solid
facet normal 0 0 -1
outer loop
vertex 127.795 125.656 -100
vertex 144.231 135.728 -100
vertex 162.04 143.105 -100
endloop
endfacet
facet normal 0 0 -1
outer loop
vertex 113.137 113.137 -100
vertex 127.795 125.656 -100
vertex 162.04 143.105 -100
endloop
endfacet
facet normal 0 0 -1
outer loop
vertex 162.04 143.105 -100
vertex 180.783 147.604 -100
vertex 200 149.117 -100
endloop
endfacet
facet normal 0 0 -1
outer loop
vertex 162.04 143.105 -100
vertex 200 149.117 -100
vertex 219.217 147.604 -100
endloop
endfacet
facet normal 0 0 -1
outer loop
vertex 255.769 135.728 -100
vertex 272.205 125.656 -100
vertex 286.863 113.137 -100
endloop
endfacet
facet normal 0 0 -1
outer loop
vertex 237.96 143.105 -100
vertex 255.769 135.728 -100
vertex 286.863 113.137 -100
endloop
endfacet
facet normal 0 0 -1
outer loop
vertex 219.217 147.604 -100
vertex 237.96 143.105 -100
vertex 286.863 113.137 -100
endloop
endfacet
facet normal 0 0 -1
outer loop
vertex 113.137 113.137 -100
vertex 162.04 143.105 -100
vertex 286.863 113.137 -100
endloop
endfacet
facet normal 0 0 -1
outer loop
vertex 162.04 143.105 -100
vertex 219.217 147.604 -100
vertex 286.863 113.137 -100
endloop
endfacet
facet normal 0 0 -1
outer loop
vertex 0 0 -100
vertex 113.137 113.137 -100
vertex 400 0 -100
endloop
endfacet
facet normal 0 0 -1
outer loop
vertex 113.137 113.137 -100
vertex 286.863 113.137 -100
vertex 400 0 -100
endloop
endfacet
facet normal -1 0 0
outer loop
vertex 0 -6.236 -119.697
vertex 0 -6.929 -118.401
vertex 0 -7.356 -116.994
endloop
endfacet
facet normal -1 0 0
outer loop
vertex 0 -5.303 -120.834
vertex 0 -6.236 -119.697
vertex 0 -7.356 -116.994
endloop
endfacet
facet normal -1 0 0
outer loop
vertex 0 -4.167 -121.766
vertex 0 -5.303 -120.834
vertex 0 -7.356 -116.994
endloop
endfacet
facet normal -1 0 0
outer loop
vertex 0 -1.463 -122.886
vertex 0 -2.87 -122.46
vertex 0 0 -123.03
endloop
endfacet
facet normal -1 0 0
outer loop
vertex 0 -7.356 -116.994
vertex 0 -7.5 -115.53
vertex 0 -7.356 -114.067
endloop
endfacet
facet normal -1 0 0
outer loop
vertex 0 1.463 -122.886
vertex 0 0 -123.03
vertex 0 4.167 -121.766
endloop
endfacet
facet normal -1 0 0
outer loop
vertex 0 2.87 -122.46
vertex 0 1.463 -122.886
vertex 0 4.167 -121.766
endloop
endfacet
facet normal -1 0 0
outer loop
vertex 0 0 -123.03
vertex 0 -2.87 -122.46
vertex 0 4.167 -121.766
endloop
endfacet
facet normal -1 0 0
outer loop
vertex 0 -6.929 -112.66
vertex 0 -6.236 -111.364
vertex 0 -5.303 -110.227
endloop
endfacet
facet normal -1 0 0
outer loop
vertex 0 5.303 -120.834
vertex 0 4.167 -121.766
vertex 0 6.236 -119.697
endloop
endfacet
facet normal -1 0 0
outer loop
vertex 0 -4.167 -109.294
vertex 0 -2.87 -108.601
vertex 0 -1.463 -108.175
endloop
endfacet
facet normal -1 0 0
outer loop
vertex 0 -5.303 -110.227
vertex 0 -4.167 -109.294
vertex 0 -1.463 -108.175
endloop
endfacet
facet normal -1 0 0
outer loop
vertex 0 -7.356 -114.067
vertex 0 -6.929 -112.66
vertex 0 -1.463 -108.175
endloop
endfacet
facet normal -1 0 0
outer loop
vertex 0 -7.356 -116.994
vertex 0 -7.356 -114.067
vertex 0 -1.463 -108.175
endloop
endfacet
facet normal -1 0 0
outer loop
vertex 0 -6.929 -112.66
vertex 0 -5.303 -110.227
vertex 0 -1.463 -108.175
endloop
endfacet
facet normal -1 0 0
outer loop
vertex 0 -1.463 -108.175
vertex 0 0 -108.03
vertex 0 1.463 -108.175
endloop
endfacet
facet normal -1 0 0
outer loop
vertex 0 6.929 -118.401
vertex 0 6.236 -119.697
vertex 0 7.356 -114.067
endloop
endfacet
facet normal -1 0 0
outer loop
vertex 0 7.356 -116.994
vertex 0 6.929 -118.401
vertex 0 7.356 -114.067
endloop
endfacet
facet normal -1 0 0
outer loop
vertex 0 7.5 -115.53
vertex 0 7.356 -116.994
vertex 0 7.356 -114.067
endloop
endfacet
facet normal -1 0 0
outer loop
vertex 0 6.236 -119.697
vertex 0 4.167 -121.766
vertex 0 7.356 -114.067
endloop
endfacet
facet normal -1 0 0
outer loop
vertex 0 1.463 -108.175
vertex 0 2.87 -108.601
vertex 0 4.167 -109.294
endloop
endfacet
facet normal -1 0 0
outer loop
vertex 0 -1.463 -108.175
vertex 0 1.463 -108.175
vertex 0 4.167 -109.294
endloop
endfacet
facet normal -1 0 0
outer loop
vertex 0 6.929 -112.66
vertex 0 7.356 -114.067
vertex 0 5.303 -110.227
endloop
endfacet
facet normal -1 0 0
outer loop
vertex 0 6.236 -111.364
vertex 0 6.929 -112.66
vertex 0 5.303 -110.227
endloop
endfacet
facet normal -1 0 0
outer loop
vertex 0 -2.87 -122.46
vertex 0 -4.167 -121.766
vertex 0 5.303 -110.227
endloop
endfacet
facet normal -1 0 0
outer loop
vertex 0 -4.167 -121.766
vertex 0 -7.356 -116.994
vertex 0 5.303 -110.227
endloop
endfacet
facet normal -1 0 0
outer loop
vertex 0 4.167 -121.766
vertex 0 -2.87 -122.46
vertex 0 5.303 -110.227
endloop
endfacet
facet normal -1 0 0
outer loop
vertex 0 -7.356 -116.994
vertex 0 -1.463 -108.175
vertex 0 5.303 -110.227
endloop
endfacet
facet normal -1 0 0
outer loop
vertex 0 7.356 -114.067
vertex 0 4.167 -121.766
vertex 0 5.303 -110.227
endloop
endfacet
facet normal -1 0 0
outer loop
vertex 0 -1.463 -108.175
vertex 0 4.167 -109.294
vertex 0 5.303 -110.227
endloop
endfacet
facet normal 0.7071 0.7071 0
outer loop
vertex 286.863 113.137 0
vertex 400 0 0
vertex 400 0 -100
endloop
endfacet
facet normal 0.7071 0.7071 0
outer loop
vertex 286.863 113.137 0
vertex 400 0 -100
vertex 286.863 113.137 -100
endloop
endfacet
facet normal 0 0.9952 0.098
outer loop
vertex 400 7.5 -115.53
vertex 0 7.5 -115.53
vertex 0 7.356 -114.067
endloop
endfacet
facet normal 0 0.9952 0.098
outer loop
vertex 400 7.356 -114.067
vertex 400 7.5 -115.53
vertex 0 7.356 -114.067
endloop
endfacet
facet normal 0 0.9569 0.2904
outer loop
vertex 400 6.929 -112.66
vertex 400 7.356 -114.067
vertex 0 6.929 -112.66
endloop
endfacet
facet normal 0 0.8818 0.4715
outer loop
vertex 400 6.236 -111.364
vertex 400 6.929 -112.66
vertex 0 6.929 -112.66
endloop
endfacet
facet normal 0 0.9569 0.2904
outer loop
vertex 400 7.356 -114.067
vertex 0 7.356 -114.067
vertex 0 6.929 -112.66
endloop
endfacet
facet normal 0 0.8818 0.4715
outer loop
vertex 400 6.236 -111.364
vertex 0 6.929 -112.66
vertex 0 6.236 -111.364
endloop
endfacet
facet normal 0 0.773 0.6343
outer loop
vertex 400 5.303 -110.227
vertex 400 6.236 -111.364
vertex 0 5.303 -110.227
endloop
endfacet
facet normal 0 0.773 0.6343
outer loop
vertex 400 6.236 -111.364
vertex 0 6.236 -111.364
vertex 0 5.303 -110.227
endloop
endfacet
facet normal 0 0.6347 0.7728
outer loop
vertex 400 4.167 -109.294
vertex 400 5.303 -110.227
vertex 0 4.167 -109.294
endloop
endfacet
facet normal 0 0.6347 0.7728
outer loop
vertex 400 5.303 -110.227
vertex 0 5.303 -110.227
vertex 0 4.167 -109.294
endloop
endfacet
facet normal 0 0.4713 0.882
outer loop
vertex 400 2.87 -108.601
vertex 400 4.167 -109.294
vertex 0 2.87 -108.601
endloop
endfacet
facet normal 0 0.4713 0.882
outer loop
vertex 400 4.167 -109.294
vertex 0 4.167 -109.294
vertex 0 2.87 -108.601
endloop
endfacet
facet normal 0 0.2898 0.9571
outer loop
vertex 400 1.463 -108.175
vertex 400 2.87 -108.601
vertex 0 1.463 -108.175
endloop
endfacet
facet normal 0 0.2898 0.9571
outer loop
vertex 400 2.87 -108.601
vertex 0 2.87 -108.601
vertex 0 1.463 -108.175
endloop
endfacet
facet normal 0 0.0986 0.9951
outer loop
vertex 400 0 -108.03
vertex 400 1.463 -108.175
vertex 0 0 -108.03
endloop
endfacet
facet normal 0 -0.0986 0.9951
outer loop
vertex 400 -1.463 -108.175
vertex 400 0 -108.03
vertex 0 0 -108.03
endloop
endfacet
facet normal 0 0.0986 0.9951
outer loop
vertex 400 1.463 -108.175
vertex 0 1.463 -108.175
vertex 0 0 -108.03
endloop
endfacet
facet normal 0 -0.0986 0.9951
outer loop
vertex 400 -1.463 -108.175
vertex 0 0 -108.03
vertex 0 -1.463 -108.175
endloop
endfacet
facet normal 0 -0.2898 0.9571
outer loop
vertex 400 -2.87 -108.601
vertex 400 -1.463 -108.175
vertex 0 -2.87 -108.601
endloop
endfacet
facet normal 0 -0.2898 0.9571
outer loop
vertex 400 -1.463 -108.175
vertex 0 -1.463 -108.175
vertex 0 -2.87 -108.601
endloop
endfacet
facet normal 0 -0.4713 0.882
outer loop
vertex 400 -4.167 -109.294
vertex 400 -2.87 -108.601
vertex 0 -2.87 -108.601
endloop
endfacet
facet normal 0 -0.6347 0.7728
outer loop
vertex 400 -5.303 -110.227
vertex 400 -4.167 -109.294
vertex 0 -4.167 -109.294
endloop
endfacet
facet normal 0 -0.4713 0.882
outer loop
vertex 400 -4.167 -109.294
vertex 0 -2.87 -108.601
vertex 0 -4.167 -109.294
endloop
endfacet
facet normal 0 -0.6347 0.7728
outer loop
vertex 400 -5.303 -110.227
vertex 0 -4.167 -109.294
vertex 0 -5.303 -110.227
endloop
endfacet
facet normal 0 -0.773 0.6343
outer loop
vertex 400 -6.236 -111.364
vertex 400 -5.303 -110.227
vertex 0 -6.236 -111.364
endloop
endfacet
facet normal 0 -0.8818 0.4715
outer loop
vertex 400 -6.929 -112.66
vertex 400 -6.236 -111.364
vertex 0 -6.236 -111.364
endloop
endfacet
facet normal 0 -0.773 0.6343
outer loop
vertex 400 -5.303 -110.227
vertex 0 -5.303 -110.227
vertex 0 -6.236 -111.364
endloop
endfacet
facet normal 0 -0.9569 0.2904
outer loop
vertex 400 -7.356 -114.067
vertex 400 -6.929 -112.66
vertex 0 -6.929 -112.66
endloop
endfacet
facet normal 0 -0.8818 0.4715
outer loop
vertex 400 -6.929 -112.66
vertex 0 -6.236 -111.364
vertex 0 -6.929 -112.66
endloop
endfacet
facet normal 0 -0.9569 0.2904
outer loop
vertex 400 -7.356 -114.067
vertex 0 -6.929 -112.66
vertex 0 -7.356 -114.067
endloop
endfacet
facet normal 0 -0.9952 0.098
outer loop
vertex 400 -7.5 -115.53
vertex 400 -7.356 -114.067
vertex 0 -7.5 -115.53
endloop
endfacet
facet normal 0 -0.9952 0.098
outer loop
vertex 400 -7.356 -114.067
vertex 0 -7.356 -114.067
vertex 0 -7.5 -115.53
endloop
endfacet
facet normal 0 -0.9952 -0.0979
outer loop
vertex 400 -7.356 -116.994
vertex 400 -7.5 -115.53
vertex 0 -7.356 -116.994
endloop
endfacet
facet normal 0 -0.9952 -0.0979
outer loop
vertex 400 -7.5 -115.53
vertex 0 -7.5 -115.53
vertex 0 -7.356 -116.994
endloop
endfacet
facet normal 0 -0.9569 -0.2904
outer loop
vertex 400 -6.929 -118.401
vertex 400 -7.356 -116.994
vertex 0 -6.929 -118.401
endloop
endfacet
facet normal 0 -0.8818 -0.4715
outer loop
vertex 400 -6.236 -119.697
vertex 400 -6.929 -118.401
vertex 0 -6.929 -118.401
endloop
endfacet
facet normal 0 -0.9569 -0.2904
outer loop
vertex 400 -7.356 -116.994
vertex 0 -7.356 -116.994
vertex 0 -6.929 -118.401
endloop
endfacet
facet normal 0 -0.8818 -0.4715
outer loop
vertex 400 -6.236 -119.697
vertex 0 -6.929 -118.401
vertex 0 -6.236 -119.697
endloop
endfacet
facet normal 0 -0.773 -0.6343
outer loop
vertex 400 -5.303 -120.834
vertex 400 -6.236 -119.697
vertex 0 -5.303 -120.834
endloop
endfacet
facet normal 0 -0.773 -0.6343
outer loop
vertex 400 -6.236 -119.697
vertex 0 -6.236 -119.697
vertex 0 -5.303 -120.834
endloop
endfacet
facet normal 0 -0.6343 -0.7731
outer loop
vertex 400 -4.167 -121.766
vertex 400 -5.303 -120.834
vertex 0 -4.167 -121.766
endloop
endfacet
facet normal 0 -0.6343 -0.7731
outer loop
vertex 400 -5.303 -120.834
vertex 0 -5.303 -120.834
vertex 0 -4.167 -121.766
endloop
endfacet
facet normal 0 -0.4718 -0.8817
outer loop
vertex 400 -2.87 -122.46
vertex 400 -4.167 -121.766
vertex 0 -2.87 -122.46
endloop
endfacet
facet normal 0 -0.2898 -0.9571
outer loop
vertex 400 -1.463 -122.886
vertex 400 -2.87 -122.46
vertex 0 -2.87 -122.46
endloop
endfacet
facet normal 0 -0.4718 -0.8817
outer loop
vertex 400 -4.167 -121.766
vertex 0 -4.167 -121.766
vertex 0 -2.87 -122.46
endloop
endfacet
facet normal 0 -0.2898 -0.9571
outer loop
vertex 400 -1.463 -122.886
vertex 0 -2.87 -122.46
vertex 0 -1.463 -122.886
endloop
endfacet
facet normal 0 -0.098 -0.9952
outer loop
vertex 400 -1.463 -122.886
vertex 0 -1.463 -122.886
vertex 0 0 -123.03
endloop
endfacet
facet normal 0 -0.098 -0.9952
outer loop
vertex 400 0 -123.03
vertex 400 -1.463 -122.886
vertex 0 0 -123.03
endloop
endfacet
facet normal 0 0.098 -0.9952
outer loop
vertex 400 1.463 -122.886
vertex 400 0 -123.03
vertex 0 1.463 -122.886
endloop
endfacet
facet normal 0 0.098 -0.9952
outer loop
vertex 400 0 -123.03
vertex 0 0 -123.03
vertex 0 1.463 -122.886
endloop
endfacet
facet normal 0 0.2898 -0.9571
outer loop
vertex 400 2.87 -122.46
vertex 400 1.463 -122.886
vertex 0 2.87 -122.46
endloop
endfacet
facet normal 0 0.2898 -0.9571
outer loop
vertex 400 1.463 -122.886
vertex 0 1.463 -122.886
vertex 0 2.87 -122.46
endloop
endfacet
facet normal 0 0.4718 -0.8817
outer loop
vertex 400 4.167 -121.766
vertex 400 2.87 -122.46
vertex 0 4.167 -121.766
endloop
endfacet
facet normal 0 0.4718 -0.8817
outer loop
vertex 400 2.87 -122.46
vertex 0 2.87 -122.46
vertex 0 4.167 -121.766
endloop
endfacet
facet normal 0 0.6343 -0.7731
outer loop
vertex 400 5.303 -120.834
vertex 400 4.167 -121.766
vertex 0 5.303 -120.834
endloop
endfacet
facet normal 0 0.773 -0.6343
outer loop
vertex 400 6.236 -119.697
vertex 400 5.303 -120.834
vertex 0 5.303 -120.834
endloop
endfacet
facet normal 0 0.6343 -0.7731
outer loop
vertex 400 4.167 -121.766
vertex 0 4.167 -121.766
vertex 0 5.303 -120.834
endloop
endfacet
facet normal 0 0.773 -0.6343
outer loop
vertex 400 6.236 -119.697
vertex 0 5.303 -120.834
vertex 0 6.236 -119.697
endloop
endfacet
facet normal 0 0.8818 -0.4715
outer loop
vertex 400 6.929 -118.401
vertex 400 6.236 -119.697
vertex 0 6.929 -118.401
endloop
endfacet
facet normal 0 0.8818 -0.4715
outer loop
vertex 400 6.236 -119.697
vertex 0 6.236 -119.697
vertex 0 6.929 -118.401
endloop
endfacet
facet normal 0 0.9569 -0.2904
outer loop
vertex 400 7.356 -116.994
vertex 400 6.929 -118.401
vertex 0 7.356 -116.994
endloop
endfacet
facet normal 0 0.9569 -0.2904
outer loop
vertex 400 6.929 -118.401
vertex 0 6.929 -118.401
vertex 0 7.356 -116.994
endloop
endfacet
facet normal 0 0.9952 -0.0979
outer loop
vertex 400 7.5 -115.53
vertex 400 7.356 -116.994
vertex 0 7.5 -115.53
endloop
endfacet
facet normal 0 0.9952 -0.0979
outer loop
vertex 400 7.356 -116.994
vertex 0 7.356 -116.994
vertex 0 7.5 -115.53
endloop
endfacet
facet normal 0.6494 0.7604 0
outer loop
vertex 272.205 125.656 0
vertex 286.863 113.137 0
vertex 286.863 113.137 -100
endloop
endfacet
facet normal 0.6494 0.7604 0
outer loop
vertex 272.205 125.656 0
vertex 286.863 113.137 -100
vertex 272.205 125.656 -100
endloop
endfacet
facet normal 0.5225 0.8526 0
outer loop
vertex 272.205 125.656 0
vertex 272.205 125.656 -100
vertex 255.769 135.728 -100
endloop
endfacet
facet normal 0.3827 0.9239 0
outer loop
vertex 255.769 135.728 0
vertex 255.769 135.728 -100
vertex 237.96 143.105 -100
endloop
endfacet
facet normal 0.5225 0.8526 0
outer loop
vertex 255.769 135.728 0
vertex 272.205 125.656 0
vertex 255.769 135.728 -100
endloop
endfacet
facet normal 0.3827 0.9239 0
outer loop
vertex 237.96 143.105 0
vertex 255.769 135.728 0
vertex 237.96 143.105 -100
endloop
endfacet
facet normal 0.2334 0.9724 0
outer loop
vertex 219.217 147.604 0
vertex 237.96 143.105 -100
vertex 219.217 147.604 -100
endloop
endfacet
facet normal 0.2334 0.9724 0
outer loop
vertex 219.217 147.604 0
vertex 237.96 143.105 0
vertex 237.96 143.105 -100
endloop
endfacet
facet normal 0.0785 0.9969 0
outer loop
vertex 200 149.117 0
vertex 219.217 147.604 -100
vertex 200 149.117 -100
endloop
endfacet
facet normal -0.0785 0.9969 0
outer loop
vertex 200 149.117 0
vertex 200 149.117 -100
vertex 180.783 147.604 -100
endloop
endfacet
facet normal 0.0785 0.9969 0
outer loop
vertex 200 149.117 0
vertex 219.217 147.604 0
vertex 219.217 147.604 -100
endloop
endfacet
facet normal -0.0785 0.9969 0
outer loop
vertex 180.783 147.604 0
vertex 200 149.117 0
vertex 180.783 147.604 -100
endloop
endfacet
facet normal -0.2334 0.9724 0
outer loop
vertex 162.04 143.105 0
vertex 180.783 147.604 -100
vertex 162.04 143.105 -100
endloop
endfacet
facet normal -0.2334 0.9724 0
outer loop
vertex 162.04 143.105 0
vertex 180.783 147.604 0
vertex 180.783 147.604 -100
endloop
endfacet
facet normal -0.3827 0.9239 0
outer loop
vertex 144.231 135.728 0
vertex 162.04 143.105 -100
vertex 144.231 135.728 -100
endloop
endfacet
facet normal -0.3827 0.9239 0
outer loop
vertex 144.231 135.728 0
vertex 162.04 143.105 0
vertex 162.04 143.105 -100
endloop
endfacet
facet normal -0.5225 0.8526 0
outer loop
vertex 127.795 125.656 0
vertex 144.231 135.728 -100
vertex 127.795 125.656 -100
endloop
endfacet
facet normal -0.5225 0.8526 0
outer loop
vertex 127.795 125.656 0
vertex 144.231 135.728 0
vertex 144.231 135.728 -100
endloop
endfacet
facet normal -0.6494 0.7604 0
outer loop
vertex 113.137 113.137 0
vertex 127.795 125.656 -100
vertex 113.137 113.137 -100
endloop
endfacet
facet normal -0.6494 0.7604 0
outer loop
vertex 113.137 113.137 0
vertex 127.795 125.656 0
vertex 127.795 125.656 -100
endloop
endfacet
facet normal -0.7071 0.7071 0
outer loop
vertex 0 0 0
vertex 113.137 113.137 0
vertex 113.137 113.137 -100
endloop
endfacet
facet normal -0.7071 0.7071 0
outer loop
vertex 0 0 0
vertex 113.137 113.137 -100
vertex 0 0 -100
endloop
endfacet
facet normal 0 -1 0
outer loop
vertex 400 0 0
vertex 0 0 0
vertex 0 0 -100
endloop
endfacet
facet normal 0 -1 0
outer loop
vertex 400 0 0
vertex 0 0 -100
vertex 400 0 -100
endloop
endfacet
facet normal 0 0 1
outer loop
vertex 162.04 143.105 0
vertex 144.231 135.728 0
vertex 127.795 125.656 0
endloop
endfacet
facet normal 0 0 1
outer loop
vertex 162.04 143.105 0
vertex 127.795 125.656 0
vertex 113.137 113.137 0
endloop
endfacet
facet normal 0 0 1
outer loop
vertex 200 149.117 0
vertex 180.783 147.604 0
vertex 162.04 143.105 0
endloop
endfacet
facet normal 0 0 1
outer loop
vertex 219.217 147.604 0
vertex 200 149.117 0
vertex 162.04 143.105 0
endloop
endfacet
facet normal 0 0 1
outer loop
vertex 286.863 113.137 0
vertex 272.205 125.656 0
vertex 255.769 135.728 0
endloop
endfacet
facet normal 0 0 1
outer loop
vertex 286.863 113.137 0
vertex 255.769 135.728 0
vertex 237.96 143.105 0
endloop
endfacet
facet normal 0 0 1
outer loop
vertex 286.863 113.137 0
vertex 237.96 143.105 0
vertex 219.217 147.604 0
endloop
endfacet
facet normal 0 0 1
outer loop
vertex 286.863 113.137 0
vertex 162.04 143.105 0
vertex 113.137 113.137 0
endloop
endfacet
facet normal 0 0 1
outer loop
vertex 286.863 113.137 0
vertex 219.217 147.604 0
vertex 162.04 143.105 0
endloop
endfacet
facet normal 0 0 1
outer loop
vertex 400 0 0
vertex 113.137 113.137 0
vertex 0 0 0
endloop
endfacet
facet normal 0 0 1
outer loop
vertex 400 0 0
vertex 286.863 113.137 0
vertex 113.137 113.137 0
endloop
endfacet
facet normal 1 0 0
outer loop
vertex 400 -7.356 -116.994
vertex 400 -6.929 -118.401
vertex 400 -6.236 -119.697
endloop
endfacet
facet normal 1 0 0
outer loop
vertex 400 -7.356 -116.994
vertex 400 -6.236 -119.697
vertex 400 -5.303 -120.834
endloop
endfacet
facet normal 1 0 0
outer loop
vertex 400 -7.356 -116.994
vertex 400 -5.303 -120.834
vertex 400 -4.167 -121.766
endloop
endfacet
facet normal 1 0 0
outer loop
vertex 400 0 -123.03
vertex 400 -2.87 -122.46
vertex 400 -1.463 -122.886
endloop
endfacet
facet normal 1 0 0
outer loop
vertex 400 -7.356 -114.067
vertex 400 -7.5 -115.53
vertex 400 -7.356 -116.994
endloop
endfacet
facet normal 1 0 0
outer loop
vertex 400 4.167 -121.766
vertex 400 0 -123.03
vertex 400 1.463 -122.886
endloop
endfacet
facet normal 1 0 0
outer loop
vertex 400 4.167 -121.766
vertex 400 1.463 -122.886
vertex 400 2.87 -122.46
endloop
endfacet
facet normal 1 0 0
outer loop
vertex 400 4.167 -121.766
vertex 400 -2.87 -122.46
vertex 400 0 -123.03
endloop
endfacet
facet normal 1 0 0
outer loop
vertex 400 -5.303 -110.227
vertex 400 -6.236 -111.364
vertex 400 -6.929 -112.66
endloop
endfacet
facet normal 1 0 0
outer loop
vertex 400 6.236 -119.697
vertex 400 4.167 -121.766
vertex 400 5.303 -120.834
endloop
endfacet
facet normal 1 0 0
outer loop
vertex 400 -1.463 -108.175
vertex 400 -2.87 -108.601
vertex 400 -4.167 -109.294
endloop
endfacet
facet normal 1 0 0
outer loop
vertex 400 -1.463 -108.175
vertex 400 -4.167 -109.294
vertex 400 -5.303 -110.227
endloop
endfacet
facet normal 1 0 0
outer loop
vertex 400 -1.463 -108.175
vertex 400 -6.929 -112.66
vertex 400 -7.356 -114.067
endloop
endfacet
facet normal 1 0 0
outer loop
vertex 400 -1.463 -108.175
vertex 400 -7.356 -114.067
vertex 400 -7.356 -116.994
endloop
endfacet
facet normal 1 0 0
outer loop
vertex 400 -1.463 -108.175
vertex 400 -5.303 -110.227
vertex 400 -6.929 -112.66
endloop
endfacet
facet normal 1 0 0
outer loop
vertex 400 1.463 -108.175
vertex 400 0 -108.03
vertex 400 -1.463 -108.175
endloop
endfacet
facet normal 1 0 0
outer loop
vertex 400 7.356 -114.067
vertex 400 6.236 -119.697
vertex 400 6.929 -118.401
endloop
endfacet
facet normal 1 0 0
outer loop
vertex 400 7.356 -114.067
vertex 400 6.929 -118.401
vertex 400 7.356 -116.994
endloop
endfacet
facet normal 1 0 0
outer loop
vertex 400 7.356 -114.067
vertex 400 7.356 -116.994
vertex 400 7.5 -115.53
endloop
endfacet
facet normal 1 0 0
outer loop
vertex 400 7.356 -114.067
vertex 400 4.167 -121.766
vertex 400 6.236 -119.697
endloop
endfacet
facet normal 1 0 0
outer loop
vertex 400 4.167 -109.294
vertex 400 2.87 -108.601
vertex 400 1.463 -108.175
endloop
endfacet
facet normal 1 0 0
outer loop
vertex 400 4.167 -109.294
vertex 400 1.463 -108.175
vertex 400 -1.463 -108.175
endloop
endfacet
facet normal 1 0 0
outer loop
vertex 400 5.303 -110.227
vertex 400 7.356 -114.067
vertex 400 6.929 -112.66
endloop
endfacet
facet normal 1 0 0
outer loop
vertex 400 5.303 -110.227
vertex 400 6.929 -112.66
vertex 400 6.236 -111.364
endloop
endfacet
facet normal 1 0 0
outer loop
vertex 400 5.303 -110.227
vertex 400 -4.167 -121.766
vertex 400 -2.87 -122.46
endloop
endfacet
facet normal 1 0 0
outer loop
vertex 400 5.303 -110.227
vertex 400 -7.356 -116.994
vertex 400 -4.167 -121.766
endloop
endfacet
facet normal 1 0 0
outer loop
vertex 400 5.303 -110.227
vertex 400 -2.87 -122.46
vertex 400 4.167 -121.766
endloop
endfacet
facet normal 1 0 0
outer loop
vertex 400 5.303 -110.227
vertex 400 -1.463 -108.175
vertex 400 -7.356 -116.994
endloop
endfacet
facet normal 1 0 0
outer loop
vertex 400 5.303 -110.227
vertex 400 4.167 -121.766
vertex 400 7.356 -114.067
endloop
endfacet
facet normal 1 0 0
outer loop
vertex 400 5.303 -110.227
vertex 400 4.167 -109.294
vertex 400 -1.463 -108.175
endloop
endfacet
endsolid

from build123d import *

# Parameters (mm, degrees)
F1_DEPTH = 100
F2_R     = 7.5
F3_DEPTH = 400


with BuildPart() as f1:
    # F0 (on Top) → F1 (new body)
    with BuildSketch(Plane.XY):
        with BuildLine():
            Line((113.137085, 113.137085), (0, 0))
            Line((0, 0), (400, 0))
            Line((400, 0), (286.862915, 113.137085))
            ThreePointArc((286.862915, 113.137085), (200, 149.116882), (113.137085, 113.137085))
        make_face()
    extrude(amount=-F1_DEPTH)


with BuildPart() as f3:
    # F2 (on Right) → F3 (new body)
    with BuildSketch(Plane.YZ):
        with Locations((0, -115.530449)):
            Circle(F2_R)
    extrude(amount=F3_DEPTH)


solid = Compound([f1.part, f3.part])
